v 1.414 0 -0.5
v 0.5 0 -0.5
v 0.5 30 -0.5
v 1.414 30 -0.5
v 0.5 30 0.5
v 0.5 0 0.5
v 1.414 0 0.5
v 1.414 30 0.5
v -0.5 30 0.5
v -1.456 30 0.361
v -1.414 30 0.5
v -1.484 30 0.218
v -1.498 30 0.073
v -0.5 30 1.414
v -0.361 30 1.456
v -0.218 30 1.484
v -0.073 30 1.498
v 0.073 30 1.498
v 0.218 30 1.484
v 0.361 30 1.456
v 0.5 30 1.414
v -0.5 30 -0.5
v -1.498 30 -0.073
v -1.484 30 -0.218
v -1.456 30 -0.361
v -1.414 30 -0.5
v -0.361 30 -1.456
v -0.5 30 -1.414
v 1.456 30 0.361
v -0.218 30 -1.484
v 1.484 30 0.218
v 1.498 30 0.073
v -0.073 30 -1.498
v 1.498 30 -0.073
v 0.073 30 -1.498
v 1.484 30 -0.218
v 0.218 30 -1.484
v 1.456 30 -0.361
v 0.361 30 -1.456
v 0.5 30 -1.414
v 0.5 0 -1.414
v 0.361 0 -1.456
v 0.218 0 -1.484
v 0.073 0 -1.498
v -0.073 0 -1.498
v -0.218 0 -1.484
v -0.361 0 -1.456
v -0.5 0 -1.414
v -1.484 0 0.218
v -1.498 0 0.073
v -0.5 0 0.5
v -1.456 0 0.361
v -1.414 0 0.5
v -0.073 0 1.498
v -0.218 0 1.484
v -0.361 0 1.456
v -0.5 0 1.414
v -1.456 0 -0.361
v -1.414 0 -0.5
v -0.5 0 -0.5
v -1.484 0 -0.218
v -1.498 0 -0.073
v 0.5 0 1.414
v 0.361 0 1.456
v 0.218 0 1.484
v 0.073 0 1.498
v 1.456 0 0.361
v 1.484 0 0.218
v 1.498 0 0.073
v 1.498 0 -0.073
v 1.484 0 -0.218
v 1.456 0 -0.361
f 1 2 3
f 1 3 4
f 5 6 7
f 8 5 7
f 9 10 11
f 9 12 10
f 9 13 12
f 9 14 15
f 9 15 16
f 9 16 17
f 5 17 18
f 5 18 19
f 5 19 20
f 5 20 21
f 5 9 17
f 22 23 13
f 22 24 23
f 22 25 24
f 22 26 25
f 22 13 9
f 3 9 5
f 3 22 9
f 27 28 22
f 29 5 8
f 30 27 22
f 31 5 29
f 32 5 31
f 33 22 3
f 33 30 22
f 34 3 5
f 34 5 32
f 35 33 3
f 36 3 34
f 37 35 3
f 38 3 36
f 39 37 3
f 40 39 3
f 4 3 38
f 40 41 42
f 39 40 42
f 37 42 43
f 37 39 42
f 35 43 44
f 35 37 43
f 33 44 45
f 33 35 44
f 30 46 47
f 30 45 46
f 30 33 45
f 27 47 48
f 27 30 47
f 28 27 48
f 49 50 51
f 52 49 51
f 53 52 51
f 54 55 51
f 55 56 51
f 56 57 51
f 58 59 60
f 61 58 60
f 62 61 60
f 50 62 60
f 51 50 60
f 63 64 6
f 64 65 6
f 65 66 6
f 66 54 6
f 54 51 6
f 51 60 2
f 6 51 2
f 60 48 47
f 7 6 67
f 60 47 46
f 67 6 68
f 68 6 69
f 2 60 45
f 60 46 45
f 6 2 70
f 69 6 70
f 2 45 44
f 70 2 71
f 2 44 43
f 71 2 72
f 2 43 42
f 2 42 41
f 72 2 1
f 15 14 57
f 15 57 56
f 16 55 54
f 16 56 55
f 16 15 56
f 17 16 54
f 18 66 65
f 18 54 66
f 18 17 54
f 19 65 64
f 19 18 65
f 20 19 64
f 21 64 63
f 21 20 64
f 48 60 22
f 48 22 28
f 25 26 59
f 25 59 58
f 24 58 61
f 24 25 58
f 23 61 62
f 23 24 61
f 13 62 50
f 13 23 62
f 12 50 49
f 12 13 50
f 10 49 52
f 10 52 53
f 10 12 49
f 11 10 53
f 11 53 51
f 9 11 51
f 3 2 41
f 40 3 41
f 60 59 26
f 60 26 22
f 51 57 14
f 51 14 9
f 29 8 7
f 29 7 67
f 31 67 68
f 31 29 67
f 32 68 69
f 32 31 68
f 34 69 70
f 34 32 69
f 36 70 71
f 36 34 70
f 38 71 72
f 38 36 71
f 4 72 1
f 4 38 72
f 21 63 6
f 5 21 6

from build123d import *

# Parameters (mm, degrees)
SKETCH1_W           = 3
SKETCH1_H           = 1
SKETCH1_W_2         = 1
SKETCH1_H_2         = 3
BOSS_EXTRUDE1_DEPTH = 30
SKETCH2_OUTSIDE_W   = 11.06
SKETCH2_OUTSIDE_H   = 11.06
SKETCH2_OUTSIDE_R   = 1.5
CUT_EXTRUDE1_DEPTH  = 30


with BuildPart() as part:
    # Sketch1 → Boss-Extrude1 (new body)
    with BuildSketch(Plane(origin=(0, 0, 0), x_dir=(1, 0, 0), z_dir=(0, 1, 0))):
        Rectangle(SKETCH1_W, SKETCH1_H)
        Rectangle(SKETCH1_W_2, SKETCH1_H_2)
    extrude(amount=BOSS_EXTRUDE1_DEPTH)

    # Sketch2 outside → Cut-Extrude1 (cut)
    with BuildSketch(Plane(origin=(0, 30, 0), x_dir=(1, 0, 0), z_dir=(0, 1, 0))):
        Rectangle(SKETCH2_OUTSIDE_W, SKETCH2_OUTSIDE_H)
        Circle(SKETCH2_OUTSIDE_R, mode=Mode.SUBTRACT)
    extrude(amount=-CUT_EXTRUDE1_DEPTH, mode=Mode.SUBTRACT)


solid = part.part
